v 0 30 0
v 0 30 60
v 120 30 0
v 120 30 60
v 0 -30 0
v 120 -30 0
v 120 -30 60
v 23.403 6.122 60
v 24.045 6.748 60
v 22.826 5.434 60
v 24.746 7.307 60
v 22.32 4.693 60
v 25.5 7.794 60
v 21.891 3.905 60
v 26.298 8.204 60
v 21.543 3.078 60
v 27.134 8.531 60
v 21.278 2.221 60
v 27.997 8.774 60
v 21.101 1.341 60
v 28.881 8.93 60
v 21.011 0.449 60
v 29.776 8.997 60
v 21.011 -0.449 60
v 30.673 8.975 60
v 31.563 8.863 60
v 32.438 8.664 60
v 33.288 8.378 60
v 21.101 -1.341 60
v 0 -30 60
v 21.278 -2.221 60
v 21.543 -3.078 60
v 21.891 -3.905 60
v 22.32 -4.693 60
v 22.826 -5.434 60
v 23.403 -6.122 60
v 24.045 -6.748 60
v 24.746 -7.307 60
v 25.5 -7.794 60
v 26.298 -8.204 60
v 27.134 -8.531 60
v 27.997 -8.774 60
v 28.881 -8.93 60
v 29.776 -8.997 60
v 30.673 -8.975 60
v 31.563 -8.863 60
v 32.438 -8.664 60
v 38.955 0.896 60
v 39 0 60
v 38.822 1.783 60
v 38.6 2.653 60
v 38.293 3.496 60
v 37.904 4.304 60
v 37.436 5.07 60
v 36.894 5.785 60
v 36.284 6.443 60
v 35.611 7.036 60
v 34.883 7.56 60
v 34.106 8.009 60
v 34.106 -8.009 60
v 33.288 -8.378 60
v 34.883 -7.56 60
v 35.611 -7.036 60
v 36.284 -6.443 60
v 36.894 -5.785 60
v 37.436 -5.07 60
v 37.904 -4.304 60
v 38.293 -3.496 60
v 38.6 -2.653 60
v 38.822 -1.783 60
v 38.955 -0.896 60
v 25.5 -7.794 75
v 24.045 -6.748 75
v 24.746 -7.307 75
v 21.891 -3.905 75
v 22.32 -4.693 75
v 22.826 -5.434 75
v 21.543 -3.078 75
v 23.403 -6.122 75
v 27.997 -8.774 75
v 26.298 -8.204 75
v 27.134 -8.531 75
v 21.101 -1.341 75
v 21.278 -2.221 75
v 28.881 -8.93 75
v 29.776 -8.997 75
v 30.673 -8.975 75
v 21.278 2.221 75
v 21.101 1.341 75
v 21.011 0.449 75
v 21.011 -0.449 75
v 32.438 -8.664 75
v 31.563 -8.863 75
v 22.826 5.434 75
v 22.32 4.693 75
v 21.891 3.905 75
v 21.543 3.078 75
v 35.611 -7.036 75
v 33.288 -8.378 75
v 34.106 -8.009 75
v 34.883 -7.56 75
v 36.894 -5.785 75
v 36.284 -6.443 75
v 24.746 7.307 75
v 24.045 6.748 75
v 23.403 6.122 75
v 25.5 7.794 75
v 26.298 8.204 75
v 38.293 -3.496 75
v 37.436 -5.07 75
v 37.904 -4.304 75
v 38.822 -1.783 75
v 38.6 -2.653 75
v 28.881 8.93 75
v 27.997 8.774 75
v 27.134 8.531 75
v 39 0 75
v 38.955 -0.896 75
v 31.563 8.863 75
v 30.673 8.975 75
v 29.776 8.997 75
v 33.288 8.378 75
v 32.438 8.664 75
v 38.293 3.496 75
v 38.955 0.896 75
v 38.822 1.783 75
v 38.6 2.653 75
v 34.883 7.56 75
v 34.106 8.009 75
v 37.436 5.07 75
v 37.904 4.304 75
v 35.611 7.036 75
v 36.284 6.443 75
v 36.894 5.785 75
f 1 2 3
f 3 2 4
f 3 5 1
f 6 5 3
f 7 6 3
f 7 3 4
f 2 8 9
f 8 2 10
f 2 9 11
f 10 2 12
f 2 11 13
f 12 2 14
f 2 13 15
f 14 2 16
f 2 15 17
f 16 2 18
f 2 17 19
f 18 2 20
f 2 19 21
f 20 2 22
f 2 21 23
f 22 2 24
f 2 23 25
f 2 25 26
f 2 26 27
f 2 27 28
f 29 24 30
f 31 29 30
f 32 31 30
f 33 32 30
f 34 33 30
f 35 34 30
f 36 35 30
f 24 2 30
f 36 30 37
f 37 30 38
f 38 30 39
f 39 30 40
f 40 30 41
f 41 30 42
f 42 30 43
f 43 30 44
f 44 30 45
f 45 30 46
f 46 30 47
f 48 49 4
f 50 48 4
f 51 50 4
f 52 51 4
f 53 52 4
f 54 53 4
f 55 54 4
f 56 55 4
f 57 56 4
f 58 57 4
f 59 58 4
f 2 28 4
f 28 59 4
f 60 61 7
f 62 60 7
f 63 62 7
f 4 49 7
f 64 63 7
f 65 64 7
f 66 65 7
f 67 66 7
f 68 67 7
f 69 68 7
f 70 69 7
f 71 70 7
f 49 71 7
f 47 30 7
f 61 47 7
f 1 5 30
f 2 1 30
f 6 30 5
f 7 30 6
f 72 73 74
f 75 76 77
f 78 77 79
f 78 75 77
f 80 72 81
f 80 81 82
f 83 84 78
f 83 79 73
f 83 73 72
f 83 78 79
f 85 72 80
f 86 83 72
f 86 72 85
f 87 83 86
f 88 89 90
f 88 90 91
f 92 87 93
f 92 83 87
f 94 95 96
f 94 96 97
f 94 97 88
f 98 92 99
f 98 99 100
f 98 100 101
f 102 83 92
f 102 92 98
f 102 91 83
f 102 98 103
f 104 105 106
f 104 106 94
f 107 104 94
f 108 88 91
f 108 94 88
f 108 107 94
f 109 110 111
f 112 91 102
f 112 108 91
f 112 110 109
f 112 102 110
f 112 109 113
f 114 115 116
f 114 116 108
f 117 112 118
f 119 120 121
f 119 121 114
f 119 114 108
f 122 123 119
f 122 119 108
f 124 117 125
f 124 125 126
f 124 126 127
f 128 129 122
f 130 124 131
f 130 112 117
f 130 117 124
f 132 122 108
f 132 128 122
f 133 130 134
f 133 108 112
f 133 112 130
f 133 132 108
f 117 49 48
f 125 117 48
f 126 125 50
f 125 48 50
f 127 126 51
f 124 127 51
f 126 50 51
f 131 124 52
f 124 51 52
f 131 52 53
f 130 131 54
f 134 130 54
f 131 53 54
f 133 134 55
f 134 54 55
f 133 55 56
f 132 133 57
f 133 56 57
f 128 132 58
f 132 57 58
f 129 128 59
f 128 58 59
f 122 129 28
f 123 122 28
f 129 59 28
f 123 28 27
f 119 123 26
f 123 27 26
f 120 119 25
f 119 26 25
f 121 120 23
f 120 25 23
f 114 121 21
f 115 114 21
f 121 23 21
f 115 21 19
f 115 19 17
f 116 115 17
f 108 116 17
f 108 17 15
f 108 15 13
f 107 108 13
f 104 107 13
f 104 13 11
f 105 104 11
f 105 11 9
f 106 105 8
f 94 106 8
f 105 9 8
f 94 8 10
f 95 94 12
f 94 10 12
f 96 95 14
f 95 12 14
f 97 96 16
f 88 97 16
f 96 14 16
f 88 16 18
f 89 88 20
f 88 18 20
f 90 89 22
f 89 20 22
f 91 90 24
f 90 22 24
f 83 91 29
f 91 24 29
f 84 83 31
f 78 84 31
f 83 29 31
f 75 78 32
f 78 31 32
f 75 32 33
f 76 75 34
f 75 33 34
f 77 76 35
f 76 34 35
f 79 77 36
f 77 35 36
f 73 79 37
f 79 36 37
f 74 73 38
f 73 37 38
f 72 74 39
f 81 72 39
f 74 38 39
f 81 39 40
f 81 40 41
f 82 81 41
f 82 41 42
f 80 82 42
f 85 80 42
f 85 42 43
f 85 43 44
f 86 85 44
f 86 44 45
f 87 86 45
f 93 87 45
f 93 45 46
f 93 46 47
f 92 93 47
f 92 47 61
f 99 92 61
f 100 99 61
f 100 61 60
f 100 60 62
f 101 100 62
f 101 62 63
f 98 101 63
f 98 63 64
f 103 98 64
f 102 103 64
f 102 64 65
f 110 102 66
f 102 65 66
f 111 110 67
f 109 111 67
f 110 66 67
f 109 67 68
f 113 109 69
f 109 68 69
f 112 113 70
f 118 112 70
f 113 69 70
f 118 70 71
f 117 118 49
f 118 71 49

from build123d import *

# Parameters (mm, degrees)
F0_W     = 120
F0_H     = 60
F1_DEPTH = 30
F2_R     = 9
F3_DEPTH = 15


with BuildPart() as f1:
    # F0 (on Front) → F1 (new body, symmetric)
    with BuildSketch(Plane.XZ):
        with Locations((60, 30)):
            Rectangle(F0_W, F0_H)
    extrude(amount=F1_DEPTH, both=True)

    # F2 (on face) → F3 (join)
    with BuildSketch(Plane.XY.offset(60)):
        with Locations((30, 0)):
            Circle(F2_R)
    extrude(amount=F3_DEPTH)


solid = f1.part
